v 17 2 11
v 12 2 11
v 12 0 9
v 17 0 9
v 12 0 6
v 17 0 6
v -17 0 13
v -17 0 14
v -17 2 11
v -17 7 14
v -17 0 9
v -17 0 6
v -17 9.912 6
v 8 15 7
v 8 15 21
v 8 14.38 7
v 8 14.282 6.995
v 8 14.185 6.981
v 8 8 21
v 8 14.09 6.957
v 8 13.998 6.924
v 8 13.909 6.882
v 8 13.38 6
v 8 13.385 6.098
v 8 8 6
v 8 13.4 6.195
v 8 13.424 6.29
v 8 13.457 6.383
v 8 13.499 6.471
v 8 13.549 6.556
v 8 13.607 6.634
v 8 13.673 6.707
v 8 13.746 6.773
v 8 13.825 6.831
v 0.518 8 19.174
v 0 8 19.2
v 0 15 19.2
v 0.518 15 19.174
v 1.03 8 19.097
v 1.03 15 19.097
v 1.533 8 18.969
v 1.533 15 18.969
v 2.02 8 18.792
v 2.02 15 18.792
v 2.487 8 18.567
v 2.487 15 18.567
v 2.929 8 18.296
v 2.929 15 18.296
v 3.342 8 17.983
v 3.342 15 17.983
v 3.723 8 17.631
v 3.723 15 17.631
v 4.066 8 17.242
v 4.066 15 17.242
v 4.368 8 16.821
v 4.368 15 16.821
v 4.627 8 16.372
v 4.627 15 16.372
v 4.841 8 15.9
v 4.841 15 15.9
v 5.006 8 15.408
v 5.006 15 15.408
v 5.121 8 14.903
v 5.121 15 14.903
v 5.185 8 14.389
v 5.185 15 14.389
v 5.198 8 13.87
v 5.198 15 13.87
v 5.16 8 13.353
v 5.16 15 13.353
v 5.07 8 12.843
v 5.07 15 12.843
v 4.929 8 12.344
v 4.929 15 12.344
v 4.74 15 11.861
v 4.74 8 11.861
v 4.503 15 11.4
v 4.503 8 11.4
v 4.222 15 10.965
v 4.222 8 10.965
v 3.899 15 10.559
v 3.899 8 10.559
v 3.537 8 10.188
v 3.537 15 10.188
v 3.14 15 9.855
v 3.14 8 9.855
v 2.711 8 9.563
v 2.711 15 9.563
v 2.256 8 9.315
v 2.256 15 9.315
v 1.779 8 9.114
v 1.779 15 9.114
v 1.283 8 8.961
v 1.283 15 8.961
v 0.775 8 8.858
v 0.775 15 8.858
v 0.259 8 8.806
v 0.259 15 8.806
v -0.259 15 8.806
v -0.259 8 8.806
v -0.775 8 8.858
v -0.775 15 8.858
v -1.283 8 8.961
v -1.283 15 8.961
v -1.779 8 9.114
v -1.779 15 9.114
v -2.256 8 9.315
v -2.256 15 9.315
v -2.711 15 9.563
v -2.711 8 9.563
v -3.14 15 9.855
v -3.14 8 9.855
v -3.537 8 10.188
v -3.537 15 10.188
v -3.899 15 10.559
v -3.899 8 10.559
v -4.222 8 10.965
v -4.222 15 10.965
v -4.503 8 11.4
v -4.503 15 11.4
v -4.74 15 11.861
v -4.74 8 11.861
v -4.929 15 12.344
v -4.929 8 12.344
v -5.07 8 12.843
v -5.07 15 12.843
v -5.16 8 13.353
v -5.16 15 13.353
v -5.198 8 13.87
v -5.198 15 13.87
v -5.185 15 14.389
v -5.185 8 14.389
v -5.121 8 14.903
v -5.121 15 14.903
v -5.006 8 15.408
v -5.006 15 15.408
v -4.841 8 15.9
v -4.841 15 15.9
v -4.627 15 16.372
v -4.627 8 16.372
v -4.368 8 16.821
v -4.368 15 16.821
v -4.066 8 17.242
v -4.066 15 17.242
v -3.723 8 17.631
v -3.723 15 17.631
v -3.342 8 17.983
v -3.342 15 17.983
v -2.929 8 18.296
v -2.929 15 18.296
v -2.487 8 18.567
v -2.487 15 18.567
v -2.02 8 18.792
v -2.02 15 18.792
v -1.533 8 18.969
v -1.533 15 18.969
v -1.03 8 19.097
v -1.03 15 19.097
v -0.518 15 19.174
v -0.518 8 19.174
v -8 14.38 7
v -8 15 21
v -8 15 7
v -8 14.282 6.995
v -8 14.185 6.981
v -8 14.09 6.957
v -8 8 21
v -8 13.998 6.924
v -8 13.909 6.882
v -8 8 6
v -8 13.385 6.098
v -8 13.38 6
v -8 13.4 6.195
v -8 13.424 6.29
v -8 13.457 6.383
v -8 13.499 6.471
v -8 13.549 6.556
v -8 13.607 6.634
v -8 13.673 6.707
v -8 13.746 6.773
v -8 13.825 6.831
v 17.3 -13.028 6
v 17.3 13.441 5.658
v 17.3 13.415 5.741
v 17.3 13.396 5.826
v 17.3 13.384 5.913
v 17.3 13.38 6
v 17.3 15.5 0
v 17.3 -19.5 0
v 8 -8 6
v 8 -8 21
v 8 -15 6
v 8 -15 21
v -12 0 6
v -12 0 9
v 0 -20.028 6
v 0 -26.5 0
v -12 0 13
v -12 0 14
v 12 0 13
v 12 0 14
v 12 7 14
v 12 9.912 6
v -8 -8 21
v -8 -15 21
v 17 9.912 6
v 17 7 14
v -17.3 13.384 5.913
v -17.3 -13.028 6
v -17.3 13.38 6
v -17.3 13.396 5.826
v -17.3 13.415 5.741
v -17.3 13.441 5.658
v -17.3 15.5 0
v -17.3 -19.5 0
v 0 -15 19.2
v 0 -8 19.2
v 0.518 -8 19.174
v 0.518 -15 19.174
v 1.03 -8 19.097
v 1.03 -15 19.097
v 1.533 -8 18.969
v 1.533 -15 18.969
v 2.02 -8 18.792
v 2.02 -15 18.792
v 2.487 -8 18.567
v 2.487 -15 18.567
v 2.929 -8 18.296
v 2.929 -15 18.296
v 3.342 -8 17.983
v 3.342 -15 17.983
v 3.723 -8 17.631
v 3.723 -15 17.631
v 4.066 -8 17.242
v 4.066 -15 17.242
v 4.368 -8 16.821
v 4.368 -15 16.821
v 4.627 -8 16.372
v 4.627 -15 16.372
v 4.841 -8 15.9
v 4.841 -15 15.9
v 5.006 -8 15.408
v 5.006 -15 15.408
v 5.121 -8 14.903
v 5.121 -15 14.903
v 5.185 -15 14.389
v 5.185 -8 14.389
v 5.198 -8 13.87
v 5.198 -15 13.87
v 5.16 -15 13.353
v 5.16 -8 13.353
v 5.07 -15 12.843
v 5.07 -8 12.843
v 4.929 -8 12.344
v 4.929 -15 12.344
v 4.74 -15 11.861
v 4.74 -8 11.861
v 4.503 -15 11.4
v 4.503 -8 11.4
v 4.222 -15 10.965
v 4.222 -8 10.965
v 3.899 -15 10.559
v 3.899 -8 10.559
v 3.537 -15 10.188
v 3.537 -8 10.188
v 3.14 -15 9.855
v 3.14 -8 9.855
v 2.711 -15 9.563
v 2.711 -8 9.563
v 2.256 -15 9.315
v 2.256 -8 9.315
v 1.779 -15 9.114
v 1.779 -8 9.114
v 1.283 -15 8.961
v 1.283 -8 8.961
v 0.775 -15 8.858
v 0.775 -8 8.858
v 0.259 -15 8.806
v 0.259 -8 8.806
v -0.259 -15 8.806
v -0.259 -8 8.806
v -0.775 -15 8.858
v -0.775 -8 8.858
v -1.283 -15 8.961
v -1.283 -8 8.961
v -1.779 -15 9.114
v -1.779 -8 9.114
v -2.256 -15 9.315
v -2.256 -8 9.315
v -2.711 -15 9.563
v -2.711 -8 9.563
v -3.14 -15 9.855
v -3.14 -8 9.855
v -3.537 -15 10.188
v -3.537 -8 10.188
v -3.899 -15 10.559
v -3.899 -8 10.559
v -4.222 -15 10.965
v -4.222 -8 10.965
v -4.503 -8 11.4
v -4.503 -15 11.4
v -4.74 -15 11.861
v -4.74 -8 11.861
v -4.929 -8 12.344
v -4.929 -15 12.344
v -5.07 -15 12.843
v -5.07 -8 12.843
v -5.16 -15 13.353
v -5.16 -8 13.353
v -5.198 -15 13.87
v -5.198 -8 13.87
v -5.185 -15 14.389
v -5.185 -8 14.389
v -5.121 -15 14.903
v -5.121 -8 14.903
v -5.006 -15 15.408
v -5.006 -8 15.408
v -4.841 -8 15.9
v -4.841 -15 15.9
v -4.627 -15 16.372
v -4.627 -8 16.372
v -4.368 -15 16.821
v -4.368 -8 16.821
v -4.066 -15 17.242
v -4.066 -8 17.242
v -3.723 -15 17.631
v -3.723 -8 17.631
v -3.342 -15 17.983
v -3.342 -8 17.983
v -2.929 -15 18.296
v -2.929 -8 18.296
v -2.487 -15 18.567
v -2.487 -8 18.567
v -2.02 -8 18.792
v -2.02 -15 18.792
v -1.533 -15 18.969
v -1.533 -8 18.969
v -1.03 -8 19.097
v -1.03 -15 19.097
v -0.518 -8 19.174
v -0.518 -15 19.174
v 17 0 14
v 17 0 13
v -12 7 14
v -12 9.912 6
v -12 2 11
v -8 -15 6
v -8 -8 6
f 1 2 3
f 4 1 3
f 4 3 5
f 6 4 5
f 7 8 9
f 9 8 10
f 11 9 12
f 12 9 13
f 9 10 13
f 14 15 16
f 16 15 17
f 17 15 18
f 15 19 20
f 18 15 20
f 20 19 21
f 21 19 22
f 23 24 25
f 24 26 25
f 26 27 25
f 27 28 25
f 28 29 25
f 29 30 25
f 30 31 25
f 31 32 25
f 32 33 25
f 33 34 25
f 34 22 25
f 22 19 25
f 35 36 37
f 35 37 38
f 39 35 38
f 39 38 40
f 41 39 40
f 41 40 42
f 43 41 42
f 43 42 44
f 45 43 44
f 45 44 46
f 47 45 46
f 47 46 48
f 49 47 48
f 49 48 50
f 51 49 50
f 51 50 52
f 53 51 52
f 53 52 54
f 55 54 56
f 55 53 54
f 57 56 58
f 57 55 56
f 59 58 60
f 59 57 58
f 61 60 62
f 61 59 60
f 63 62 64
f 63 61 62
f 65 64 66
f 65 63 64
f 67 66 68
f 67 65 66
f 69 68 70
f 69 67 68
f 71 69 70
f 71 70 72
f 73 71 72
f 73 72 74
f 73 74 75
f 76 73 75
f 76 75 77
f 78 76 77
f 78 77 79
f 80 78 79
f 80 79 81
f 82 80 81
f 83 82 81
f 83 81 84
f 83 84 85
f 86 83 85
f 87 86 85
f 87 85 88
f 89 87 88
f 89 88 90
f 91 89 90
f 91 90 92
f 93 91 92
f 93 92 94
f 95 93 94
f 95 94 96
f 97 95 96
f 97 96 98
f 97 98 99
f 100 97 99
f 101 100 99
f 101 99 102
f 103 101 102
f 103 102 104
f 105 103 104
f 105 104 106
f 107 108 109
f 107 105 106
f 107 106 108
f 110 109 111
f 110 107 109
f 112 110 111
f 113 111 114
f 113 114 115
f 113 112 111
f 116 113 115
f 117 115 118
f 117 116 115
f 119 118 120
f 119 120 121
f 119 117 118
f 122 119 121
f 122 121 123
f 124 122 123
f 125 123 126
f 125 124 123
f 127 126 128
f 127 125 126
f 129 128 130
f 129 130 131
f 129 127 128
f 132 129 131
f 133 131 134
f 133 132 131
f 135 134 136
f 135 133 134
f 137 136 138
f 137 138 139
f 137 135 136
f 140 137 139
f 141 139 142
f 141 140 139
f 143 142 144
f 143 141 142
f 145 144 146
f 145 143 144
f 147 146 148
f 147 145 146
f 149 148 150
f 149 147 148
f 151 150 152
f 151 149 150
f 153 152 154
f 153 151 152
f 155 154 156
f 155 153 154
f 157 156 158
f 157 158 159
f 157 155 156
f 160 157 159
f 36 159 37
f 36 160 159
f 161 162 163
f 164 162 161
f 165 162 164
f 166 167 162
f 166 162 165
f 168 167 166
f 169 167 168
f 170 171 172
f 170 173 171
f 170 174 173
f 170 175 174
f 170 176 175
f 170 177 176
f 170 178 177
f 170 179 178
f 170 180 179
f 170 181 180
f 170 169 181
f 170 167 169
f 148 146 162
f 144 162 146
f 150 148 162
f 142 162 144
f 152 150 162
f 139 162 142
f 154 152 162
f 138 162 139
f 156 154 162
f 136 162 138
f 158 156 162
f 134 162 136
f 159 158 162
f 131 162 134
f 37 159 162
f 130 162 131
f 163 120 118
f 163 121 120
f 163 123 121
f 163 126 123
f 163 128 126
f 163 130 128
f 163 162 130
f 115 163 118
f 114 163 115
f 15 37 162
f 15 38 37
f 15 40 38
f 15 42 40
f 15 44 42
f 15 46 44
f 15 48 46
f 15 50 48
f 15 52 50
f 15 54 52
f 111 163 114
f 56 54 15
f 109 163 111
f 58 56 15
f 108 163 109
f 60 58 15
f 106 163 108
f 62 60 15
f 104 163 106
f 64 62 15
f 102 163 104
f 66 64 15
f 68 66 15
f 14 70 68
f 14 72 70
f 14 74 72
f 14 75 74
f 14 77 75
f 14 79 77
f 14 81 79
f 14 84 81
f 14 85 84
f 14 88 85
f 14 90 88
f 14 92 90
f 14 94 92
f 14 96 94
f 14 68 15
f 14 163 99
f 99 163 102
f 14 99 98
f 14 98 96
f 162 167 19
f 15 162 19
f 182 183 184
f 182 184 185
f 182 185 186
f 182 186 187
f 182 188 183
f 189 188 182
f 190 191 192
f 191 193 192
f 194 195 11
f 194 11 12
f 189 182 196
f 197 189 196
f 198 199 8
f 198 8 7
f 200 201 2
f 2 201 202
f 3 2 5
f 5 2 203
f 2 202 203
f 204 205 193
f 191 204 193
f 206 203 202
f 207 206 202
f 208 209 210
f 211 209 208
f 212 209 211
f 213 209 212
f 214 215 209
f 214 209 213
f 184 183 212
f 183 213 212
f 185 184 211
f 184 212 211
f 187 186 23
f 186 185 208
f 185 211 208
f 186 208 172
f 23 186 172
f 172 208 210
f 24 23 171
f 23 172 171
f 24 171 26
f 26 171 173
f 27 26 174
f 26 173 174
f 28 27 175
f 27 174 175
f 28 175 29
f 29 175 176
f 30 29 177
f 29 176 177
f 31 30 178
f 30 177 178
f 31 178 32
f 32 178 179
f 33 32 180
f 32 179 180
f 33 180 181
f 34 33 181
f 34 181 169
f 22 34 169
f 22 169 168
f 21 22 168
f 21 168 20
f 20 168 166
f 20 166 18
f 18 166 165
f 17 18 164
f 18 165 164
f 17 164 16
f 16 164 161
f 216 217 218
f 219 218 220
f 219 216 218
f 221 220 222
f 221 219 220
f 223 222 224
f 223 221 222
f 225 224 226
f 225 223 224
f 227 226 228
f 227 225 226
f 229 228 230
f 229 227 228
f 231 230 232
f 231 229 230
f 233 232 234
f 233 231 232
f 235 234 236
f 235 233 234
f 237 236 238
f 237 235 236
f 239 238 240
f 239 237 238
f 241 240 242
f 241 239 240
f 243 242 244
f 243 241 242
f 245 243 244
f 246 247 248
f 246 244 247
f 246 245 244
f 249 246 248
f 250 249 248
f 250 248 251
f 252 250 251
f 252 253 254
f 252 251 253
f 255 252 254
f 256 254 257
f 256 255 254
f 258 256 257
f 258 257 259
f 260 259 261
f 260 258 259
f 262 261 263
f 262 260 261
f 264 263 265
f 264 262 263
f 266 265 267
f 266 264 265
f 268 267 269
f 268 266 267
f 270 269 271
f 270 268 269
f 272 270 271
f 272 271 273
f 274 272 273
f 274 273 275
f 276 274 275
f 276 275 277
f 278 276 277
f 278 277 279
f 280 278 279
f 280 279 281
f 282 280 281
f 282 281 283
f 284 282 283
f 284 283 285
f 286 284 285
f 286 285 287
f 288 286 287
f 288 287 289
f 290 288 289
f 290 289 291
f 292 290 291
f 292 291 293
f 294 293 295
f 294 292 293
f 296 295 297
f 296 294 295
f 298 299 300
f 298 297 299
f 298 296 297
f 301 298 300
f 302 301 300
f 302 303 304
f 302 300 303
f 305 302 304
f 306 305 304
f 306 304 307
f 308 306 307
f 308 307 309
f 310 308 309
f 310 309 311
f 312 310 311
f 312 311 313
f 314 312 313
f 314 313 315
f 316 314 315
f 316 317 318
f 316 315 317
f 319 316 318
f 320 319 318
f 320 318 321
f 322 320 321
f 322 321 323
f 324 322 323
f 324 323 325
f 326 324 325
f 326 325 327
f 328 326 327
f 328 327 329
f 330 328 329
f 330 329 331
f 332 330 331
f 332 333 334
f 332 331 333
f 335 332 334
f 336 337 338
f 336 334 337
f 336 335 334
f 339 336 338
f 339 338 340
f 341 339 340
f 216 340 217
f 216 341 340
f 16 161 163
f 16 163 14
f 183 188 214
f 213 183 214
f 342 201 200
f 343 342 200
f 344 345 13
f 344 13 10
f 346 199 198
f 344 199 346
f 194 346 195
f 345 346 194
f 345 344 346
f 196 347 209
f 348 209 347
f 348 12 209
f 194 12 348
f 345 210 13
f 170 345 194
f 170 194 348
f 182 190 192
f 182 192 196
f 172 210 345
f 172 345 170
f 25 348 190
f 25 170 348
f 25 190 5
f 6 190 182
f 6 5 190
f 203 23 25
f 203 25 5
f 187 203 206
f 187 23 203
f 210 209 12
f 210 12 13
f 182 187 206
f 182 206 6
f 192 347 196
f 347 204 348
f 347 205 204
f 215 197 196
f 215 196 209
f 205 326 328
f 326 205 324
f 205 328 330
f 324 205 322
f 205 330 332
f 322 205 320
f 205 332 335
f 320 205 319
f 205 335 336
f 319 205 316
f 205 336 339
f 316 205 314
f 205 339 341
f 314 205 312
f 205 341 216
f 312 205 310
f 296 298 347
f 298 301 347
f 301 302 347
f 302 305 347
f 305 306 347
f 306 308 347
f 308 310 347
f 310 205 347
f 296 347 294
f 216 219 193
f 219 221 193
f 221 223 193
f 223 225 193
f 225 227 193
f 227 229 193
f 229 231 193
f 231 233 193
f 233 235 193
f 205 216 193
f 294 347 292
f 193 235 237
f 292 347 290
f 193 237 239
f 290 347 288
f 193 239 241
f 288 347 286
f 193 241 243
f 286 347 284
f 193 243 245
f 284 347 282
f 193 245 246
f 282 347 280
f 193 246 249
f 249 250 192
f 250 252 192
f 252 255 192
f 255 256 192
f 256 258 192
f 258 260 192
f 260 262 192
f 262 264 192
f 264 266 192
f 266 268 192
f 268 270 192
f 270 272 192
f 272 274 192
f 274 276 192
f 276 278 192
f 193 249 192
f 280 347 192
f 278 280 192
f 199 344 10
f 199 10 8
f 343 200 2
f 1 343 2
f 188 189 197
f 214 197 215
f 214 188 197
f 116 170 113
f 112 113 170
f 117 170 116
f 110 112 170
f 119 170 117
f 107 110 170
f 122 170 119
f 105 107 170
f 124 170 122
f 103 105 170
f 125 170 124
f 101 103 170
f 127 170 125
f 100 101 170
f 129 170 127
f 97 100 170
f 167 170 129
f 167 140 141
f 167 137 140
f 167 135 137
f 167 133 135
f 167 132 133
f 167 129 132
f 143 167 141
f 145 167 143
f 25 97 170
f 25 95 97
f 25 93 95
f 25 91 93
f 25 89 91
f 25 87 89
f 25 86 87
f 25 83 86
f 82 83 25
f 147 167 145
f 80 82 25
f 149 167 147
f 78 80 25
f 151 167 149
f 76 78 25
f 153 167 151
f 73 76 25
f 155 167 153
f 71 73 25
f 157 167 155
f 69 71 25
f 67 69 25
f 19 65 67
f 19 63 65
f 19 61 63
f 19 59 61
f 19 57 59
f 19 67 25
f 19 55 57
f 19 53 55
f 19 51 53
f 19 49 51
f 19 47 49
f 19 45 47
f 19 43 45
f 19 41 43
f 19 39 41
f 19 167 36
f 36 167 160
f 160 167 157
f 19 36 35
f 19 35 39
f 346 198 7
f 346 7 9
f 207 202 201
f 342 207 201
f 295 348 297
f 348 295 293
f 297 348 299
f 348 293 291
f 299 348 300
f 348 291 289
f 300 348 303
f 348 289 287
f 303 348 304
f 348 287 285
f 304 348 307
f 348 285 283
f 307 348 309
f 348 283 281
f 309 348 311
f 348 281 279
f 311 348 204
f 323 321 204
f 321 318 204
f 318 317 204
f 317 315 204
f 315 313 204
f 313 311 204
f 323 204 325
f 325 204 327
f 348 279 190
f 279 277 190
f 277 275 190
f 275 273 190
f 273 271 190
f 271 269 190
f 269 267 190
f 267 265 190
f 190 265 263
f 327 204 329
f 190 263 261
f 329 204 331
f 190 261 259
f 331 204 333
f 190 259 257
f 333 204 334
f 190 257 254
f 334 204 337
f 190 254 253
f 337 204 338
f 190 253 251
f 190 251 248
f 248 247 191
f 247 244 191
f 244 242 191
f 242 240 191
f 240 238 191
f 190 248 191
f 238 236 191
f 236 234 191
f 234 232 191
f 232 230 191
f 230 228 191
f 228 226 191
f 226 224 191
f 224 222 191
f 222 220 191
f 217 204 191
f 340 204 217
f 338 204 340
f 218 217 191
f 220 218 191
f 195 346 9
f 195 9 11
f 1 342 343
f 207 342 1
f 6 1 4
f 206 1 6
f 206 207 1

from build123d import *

# Parameters (mm, degrees)
ESBO_O1_W                     = 34.6
ESBO_O1_H                     = 26
RESSALTO_EXTRUS_O1_DEPTH      = 7
ESBO_O10_W                    = 34.6
ESBO_O10_H                    = 2.5
RESSALTO_EXTRUS_O4_DEPTH      = 7
CHANFRO1_SIZE                 = 7
CHANFRO2_SIZE2                = 7
CHANFRO2_SIZE                 = 2.54779164
RESSALTO_EXTRUS_O5_DEPTH      = 15
RESSALTO_EXTRUS_O5_DEPTH_BACK = 15
ESBO_O11_W                    = 16
ESBO_O11_H                    = 14
ESBO_O11_R                    = 5.2
CORTE_EXTRUS_O2_DEPTH         = 1
FILETE1_R                     = 1
RESSALTO_EXTRUS_O6_START      = 12
RESSALTO_EXTRUS_O6_DEPTH      = 5
ESBO_O15_W                    = 19.413269766
ESBO_O15_H                    = 16
CORTE_EXTRUS_O3_DEPTH         = 15


with BuildPart() as part:
    # Esboço1 → Ressalto-extrusão1 (new body)
    with BuildSketch(Plane.XY):
        Rectangle(ESBO_O1_W, ESBO_O1_H)
    extrude(amount=RESSALTO_EXTRUS_O1_DEPTH)

    # Esboço10 → Ressalto-extrusão4 (add)
    with BuildSketch(Plane(origin=(0, 0, 0), x_dir=(-1, 0, 0), z_dir=(0, 0, -1))):
        Polygon((-17.3, -19.5), (0, -26.5), (17.3, -19.5), (17.3, -13), (-17.3, -13), align=None)
        with Locations((0, 14.25)):
            Rectangle(ESBO_O10_W, ESBO_O10_H)
    extrude(amount=-RESSALTO_EXTRUS_O4_DEPTH)

    # Chanfro1
    chanfro1_edges = [part.edges().sort_by_distance(p)[0] for p in [
        (8.65, -23, 7),
        (-8.65, -23, 7),
    ]]
    chamfer(chanfro1_edges, length=CHANFRO1_SIZE - 0.0001)  # a hair under: the kernel refuses the full size

    # Chanfro2
    chanfro2_edges = [part.edges().sort_by_distance(p)[0] for p in [
        (0, 15.5, 7),
    ]]
    chanfro2_side = [part.faces().sort_by_distance(p)[0] for p in [
        (0, 15.449044167, 7),
    ]]
    chamfer(chanfro2_edges, length=CHANFRO2_SIZE - 0.0001, length2=CHANFRO2_SIZE2 - 0.0001, reference=chanfro2_side[0])  # a hair under: the kernel refuses the full size

    # Esboço11 → Ressalto-extrusão5 (add, two sides: drawn at the far end of the back side and taken through both)
    with BuildSketch(Plane(origin=(0, 0, 0), x_dir=(1, 0, 0), z_dir=(0, 1, 0)).offset(-RESSALTO_EXTRUS_O5_DEPTH_BACK)):
        with Locations((0, -14)):
            Rectangle(ESBO_O11_W, ESBO_O11_H)
        with Locations(Location((0, -14, 0), (0, 0, 270))):
            Circle(ESBO_O11_R, mode=Mode.SUBTRACT)
    extrude(amount=RESSALTO_EXTRUS_O5_DEPTH + RESSALTO_EXTRUS_O5_DEPTH_BACK)

    # Esboço13 → Corte-extrusão2 (cut)
    with BuildSketch(Plane.XY.offset(7)):
        Polygon((8, -15), (-8, -15), (-8, 18.845540147), (-17.3, 18.845540147), (-17.3, -24.216996946), (-0.570267535, -24.216996946), (17.3, -21.247378204), (17.3, 18.845540147), (8, 18.845540147), align=None)
    extrude(amount=-CORTE_EXTRUS_O2_DEPTH, mode=Mode.SUBTRACT)

    # Filete1
    filete1_edges = [part.edges().sort_by_distance(p)[0] for p in [
        (0, 12.95230836, 7),
    ]]
    fillet(filete1_edges, radius=FILETE1_R)

    # Esboço14 → Ressalto-extrusão6 (add)
    with BuildSketch(Plane(origin=(0, 0, 0), x_dir=(0, 0, -1), z_dir=(1, 0, 0)).offset(RESSALTO_EXTRUS_O6_START)):
        Polygon((-6, 9.911761874), (-14, 7), (-14, 0), (-13, 0), (-11, 2), (-9, 0), (-6, 0), align=None)
    ressalto_extrus_o6 = extrude(amount=RESSALTO_EXTRUS_O6_DEPTH)

    # Espelhar1: Ressalto-extrusão6 across plane
    add(ressalto_extrus_o6.mirror(Plane(origin=(0, 0, 0), x_dir=(0, 0, 1), z_dir=(1, 0, 0))))

    # Esboço15 → Corte-extrusão3 (cut)
    with BuildSketch(Plane.XY.offset(21)):
        Rectangle(ESBO_O15_W, ESBO_O15_H)
    extrude(amount=-CORTE_EXTRUS_O3_DEPTH, mode=Mode.SUBTRACT)


solid = part.part
